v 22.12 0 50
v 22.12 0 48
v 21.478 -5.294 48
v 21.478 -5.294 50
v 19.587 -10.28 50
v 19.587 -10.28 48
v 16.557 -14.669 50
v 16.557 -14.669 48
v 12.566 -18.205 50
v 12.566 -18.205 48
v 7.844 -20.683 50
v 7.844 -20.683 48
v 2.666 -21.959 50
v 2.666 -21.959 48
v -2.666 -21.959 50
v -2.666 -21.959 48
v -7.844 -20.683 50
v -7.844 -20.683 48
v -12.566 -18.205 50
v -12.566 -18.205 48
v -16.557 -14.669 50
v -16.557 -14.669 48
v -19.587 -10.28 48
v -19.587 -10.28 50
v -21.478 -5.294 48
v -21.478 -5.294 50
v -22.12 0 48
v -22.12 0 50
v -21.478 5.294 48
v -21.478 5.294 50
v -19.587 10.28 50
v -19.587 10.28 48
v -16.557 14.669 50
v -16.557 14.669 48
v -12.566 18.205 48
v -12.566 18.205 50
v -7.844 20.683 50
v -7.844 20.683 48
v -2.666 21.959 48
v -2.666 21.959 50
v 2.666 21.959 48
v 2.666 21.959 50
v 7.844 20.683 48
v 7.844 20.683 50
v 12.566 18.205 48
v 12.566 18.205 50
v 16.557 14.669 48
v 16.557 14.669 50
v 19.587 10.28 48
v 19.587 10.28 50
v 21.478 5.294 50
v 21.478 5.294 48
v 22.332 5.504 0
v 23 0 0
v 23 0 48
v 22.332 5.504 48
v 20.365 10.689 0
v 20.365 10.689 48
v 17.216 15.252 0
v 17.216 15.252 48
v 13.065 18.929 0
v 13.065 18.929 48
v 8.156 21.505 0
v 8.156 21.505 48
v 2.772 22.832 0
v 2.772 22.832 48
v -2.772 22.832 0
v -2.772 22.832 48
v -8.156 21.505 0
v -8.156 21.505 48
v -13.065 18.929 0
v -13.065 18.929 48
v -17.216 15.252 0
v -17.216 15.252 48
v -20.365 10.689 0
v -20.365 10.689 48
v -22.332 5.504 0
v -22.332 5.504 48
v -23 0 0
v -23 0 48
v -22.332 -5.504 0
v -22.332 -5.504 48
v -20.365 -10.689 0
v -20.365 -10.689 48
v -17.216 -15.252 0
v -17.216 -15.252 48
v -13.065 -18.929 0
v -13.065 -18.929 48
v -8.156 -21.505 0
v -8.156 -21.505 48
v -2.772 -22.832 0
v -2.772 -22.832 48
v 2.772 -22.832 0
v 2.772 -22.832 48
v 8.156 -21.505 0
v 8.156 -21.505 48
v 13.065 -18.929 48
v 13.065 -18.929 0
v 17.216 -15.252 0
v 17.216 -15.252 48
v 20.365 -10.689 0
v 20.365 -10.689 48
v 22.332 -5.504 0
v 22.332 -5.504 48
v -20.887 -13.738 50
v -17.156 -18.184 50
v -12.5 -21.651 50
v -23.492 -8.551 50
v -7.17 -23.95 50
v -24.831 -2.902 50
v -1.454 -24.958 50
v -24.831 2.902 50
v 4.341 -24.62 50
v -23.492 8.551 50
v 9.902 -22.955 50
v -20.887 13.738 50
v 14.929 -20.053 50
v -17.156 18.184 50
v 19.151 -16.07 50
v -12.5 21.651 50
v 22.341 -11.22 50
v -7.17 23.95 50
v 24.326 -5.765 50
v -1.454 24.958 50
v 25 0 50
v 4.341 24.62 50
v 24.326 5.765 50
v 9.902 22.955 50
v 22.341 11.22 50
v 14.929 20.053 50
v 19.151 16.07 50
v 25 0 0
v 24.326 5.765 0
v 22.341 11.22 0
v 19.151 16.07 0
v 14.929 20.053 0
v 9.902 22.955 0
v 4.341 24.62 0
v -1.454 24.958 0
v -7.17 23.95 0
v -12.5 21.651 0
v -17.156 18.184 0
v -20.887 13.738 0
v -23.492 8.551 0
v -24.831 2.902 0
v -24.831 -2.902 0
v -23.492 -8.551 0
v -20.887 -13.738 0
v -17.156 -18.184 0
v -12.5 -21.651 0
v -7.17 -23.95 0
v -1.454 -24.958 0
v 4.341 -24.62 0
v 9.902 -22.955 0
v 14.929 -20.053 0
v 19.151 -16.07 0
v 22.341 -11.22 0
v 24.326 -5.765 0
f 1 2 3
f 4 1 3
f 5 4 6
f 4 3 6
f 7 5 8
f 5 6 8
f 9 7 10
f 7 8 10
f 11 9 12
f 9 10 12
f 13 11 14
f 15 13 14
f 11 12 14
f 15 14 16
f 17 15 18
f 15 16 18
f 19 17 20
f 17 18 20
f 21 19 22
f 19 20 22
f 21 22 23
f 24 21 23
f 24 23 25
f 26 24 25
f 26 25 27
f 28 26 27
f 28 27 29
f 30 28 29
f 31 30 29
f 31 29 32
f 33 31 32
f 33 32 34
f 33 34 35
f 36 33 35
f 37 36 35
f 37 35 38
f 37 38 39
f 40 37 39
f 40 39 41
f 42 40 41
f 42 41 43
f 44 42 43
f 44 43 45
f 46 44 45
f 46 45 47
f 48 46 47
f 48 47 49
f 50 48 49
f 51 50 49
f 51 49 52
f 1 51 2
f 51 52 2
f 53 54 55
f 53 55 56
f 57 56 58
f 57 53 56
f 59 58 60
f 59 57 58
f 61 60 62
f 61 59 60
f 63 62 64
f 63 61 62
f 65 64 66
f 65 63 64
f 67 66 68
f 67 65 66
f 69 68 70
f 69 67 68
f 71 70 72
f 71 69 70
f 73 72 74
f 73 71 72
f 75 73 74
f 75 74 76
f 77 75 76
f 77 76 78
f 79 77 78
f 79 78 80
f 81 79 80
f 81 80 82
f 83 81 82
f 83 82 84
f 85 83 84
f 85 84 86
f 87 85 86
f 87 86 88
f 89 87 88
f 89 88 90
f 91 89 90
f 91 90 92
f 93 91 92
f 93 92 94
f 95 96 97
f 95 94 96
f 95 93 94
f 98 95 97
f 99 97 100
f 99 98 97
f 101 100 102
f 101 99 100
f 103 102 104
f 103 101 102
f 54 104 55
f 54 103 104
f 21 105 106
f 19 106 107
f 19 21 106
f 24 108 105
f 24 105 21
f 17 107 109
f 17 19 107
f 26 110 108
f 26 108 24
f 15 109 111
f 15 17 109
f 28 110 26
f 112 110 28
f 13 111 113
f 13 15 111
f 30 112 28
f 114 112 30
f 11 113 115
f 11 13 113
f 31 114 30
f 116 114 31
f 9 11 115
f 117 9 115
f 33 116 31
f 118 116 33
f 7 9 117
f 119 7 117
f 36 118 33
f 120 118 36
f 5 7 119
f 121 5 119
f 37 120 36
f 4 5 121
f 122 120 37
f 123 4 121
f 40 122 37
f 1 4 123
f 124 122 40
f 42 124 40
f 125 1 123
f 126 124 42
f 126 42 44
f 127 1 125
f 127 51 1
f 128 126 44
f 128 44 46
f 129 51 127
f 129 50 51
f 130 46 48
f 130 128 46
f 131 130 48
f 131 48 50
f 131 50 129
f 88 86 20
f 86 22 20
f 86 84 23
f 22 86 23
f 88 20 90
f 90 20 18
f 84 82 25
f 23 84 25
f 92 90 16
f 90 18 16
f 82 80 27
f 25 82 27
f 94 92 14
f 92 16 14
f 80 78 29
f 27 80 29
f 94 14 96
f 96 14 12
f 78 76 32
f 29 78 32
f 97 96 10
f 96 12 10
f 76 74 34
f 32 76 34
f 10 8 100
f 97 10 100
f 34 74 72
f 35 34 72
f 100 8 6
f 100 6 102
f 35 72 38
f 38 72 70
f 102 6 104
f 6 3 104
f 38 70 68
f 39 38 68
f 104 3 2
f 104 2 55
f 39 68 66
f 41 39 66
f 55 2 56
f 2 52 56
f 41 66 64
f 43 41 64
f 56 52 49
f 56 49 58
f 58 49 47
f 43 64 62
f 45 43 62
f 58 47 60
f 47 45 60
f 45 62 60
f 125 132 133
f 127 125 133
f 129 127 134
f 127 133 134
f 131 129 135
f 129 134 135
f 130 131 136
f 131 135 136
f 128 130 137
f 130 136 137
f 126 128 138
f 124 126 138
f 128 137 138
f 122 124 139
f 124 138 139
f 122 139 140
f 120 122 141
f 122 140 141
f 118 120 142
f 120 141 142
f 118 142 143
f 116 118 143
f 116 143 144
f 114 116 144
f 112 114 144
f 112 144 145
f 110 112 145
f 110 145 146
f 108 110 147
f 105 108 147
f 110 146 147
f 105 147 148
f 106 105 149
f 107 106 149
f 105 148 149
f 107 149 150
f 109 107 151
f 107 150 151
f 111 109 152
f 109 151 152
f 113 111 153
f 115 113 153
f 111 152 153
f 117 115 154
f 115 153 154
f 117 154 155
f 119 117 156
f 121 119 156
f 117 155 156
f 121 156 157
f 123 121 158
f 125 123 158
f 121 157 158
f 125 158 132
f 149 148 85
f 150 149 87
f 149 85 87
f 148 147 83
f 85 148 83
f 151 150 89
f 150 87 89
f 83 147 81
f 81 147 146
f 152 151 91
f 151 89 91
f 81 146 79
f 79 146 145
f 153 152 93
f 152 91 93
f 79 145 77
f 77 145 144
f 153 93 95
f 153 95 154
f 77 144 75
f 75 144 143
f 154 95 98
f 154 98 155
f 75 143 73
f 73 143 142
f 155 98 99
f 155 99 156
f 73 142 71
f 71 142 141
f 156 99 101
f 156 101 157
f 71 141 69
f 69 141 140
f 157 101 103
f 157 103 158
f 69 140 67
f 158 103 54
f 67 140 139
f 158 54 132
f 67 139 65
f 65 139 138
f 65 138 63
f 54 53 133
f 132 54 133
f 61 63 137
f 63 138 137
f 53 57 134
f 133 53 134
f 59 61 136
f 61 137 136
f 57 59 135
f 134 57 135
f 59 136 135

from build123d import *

# Parameters (mm, degrees)
F0_R     = 25
F1_DEPTH = 50
F2_T     = -2
F3_R     = 22.120492
F4_DEPTH = 25


with BuildPart() as f1:
    # F0 (on Top) → F1 (new body)
    with BuildSketch(Plane.XY):
        Circle(F0_R)
    extrude(amount=F1_DEPTH)

    # F2
    f2_openings = [f1.faces().sort_by_distance(p)[0] for p in [
        (0, 0, 0),
    ]]
    offset(amount=F2_T, openings=f2_openings)

    # F3 (on face) → F4 (cut)
    with BuildSketch(Plane(origin=(0, 0, 48), x_dir=(1, 0, 0), z_dir=(0, 0, -1))):
        Circle(F3_R)
    extrude(amount=-F4_DEPTH, mode=Mode.SUBTRACT)


solid = f1.part
